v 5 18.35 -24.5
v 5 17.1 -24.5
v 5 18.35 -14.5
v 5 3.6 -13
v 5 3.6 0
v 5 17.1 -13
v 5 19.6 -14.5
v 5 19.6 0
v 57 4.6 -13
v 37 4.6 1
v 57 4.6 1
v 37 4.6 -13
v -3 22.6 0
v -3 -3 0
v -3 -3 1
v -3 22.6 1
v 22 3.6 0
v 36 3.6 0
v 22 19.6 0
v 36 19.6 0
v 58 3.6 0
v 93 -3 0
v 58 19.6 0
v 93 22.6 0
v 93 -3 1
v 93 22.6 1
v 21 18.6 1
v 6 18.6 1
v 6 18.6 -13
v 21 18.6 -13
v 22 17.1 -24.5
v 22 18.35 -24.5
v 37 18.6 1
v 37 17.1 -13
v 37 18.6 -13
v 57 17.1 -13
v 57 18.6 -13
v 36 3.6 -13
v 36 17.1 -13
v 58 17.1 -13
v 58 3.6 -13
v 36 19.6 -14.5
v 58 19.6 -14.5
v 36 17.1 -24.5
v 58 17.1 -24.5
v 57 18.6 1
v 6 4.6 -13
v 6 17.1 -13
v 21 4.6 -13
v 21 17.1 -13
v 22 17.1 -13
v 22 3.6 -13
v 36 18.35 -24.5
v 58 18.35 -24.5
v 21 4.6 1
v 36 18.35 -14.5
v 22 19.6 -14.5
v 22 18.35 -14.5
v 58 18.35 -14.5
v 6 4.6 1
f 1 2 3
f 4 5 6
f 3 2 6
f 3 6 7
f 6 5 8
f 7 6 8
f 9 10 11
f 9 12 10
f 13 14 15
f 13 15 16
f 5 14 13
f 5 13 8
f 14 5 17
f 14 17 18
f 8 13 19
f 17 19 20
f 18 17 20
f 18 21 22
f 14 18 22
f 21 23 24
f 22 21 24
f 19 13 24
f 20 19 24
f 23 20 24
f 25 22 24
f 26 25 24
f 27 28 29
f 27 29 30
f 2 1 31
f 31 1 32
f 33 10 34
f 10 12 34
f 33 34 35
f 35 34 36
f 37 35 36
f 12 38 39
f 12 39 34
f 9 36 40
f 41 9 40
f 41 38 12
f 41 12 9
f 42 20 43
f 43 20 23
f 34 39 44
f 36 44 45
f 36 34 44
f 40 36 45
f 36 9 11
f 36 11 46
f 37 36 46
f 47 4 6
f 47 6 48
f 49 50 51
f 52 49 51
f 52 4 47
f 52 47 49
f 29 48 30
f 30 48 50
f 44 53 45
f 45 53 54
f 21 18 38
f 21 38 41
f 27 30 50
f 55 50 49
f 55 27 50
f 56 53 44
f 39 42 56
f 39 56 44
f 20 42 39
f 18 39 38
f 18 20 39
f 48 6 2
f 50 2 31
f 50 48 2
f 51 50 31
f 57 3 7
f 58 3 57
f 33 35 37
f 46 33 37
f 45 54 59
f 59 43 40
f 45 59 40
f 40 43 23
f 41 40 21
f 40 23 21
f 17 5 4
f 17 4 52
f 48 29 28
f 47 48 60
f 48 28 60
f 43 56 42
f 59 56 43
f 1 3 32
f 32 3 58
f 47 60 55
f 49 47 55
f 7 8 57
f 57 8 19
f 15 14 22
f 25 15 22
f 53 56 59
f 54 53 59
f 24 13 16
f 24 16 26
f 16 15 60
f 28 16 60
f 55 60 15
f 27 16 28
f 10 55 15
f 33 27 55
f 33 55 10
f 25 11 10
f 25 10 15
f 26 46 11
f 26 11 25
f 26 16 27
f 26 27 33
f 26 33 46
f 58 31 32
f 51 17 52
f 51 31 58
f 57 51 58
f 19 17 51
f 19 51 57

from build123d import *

# Parameters (mm, degrees)
F0_W      = 90
F0_H      = 19.6
F0_W_2    = 15
F0_H_2    = 14
F0_W_3    = 20
F1_DEPTH  = 1
F2_W      = 17
F2_H      = 16
F2_W_2    = 15
F2_H_2    = 14
F2_W_3    = 22
F2_W_4    = 20
F3_DEPTH  = 13
F4_W      = 96
F4_H      = 25.6
F4_W_2    = 15
F4_H_2    = 14
F4_W_3    = 20
F5_DEPTH  = 1
F6_W      = 17
F6_H      = 2.5
F7_W      = 22
F7_H      = 2.5
F8_DEPTH  = 1.5
F10_W     = 17
F10_H     = 1.25
F10_W_2   = 22
F11_DEPTH = 10


with BuildPart() as f1:
    # F0 (on Top) → F1 (new body)
    with BuildSketch(Plane.XY):
        with Locations((45, 9.8)):
            Rectangle(F0_W, F0_H)
        with Locations((13.5, 11.6)):
            Rectangle(F0_W_2, F0_H_2, mode=Mode.SUBTRACT)
        with Locations((47, 11.6)):
            Rectangle(F0_W_3, F0_H_2, mode=Mode.SUBTRACT)
    extrude(amount=F1_DEPTH)

    # F2 (on face) → F3 (join)
    with BuildSketch(Plane(origin=(0, 0, 0), x_dir=(1, 0, 0), z_dir=(0, 0, -1))):
        with Locations((13.5, -11.6)):
            Rectangle(F2_W, F2_H)
        with Locations((13.5, -11.6)):
            Rectangle(F2_W_2, F2_H_2, mode=Mode.SUBTRACT)
        with Locations((47, -11.6)):
            Rectangle(F2_W_3, F2_H)
        with Locations((47, -11.6)):
            Rectangle(F2_W_4, F2_H_2, mode=Mode.SUBTRACT)
    extrude(amount=F3_DEPTH)

    # F4 (on Top) → F5 (join, through all)
    with BuildSketch(Plane.XY):
        with Locations((45, 9.8)):
            Rectangle(F4_W, F4_H)
        with Locations((13.5, 11.6)):
            Rectangle(F4_W_2, F4_H_2, mode=Mode.SUBTRACT)
        with Locations((47, 11.6)):
            Rectangle(F4_W_3, F4_H_2, mode=Mode.SUBTRACT)
    extrude(amount=F5_DEPTH)

    # F6 (on face) + F7 (on face) → F8 (join)
    with BuildSketch(Plane(origin=(0, 0, -13), x_dir=(1, 0, 0), z_dir=(0, 0, -1))):
        with Locations((13.5, -18.35)):
            Rectangle(F6_W, F6_H)
    with BuildSketch(Plane(origin=(0, 0, -13), x_dir=(1, 0, 0), z_dir=(0, 0, -1))):
        with Locations((47, -18.35)):
            Rectangle(F7_W, F7_H)
    extrude(amount=F8_DEPTH)

    # F10 (on 3pt) → F11 (join)
    with BuildSketch(Plane.XY.offset(-14.5)):
        with Locations((13.5, 17.725)):
            Rectangle(F10_W, F10_H)
        with Locations((47, 17.725)):
            Rectangle(F10_W_2, F10_H)
    extrude(amount=-F11_DEPTH)


solid = f1.part
